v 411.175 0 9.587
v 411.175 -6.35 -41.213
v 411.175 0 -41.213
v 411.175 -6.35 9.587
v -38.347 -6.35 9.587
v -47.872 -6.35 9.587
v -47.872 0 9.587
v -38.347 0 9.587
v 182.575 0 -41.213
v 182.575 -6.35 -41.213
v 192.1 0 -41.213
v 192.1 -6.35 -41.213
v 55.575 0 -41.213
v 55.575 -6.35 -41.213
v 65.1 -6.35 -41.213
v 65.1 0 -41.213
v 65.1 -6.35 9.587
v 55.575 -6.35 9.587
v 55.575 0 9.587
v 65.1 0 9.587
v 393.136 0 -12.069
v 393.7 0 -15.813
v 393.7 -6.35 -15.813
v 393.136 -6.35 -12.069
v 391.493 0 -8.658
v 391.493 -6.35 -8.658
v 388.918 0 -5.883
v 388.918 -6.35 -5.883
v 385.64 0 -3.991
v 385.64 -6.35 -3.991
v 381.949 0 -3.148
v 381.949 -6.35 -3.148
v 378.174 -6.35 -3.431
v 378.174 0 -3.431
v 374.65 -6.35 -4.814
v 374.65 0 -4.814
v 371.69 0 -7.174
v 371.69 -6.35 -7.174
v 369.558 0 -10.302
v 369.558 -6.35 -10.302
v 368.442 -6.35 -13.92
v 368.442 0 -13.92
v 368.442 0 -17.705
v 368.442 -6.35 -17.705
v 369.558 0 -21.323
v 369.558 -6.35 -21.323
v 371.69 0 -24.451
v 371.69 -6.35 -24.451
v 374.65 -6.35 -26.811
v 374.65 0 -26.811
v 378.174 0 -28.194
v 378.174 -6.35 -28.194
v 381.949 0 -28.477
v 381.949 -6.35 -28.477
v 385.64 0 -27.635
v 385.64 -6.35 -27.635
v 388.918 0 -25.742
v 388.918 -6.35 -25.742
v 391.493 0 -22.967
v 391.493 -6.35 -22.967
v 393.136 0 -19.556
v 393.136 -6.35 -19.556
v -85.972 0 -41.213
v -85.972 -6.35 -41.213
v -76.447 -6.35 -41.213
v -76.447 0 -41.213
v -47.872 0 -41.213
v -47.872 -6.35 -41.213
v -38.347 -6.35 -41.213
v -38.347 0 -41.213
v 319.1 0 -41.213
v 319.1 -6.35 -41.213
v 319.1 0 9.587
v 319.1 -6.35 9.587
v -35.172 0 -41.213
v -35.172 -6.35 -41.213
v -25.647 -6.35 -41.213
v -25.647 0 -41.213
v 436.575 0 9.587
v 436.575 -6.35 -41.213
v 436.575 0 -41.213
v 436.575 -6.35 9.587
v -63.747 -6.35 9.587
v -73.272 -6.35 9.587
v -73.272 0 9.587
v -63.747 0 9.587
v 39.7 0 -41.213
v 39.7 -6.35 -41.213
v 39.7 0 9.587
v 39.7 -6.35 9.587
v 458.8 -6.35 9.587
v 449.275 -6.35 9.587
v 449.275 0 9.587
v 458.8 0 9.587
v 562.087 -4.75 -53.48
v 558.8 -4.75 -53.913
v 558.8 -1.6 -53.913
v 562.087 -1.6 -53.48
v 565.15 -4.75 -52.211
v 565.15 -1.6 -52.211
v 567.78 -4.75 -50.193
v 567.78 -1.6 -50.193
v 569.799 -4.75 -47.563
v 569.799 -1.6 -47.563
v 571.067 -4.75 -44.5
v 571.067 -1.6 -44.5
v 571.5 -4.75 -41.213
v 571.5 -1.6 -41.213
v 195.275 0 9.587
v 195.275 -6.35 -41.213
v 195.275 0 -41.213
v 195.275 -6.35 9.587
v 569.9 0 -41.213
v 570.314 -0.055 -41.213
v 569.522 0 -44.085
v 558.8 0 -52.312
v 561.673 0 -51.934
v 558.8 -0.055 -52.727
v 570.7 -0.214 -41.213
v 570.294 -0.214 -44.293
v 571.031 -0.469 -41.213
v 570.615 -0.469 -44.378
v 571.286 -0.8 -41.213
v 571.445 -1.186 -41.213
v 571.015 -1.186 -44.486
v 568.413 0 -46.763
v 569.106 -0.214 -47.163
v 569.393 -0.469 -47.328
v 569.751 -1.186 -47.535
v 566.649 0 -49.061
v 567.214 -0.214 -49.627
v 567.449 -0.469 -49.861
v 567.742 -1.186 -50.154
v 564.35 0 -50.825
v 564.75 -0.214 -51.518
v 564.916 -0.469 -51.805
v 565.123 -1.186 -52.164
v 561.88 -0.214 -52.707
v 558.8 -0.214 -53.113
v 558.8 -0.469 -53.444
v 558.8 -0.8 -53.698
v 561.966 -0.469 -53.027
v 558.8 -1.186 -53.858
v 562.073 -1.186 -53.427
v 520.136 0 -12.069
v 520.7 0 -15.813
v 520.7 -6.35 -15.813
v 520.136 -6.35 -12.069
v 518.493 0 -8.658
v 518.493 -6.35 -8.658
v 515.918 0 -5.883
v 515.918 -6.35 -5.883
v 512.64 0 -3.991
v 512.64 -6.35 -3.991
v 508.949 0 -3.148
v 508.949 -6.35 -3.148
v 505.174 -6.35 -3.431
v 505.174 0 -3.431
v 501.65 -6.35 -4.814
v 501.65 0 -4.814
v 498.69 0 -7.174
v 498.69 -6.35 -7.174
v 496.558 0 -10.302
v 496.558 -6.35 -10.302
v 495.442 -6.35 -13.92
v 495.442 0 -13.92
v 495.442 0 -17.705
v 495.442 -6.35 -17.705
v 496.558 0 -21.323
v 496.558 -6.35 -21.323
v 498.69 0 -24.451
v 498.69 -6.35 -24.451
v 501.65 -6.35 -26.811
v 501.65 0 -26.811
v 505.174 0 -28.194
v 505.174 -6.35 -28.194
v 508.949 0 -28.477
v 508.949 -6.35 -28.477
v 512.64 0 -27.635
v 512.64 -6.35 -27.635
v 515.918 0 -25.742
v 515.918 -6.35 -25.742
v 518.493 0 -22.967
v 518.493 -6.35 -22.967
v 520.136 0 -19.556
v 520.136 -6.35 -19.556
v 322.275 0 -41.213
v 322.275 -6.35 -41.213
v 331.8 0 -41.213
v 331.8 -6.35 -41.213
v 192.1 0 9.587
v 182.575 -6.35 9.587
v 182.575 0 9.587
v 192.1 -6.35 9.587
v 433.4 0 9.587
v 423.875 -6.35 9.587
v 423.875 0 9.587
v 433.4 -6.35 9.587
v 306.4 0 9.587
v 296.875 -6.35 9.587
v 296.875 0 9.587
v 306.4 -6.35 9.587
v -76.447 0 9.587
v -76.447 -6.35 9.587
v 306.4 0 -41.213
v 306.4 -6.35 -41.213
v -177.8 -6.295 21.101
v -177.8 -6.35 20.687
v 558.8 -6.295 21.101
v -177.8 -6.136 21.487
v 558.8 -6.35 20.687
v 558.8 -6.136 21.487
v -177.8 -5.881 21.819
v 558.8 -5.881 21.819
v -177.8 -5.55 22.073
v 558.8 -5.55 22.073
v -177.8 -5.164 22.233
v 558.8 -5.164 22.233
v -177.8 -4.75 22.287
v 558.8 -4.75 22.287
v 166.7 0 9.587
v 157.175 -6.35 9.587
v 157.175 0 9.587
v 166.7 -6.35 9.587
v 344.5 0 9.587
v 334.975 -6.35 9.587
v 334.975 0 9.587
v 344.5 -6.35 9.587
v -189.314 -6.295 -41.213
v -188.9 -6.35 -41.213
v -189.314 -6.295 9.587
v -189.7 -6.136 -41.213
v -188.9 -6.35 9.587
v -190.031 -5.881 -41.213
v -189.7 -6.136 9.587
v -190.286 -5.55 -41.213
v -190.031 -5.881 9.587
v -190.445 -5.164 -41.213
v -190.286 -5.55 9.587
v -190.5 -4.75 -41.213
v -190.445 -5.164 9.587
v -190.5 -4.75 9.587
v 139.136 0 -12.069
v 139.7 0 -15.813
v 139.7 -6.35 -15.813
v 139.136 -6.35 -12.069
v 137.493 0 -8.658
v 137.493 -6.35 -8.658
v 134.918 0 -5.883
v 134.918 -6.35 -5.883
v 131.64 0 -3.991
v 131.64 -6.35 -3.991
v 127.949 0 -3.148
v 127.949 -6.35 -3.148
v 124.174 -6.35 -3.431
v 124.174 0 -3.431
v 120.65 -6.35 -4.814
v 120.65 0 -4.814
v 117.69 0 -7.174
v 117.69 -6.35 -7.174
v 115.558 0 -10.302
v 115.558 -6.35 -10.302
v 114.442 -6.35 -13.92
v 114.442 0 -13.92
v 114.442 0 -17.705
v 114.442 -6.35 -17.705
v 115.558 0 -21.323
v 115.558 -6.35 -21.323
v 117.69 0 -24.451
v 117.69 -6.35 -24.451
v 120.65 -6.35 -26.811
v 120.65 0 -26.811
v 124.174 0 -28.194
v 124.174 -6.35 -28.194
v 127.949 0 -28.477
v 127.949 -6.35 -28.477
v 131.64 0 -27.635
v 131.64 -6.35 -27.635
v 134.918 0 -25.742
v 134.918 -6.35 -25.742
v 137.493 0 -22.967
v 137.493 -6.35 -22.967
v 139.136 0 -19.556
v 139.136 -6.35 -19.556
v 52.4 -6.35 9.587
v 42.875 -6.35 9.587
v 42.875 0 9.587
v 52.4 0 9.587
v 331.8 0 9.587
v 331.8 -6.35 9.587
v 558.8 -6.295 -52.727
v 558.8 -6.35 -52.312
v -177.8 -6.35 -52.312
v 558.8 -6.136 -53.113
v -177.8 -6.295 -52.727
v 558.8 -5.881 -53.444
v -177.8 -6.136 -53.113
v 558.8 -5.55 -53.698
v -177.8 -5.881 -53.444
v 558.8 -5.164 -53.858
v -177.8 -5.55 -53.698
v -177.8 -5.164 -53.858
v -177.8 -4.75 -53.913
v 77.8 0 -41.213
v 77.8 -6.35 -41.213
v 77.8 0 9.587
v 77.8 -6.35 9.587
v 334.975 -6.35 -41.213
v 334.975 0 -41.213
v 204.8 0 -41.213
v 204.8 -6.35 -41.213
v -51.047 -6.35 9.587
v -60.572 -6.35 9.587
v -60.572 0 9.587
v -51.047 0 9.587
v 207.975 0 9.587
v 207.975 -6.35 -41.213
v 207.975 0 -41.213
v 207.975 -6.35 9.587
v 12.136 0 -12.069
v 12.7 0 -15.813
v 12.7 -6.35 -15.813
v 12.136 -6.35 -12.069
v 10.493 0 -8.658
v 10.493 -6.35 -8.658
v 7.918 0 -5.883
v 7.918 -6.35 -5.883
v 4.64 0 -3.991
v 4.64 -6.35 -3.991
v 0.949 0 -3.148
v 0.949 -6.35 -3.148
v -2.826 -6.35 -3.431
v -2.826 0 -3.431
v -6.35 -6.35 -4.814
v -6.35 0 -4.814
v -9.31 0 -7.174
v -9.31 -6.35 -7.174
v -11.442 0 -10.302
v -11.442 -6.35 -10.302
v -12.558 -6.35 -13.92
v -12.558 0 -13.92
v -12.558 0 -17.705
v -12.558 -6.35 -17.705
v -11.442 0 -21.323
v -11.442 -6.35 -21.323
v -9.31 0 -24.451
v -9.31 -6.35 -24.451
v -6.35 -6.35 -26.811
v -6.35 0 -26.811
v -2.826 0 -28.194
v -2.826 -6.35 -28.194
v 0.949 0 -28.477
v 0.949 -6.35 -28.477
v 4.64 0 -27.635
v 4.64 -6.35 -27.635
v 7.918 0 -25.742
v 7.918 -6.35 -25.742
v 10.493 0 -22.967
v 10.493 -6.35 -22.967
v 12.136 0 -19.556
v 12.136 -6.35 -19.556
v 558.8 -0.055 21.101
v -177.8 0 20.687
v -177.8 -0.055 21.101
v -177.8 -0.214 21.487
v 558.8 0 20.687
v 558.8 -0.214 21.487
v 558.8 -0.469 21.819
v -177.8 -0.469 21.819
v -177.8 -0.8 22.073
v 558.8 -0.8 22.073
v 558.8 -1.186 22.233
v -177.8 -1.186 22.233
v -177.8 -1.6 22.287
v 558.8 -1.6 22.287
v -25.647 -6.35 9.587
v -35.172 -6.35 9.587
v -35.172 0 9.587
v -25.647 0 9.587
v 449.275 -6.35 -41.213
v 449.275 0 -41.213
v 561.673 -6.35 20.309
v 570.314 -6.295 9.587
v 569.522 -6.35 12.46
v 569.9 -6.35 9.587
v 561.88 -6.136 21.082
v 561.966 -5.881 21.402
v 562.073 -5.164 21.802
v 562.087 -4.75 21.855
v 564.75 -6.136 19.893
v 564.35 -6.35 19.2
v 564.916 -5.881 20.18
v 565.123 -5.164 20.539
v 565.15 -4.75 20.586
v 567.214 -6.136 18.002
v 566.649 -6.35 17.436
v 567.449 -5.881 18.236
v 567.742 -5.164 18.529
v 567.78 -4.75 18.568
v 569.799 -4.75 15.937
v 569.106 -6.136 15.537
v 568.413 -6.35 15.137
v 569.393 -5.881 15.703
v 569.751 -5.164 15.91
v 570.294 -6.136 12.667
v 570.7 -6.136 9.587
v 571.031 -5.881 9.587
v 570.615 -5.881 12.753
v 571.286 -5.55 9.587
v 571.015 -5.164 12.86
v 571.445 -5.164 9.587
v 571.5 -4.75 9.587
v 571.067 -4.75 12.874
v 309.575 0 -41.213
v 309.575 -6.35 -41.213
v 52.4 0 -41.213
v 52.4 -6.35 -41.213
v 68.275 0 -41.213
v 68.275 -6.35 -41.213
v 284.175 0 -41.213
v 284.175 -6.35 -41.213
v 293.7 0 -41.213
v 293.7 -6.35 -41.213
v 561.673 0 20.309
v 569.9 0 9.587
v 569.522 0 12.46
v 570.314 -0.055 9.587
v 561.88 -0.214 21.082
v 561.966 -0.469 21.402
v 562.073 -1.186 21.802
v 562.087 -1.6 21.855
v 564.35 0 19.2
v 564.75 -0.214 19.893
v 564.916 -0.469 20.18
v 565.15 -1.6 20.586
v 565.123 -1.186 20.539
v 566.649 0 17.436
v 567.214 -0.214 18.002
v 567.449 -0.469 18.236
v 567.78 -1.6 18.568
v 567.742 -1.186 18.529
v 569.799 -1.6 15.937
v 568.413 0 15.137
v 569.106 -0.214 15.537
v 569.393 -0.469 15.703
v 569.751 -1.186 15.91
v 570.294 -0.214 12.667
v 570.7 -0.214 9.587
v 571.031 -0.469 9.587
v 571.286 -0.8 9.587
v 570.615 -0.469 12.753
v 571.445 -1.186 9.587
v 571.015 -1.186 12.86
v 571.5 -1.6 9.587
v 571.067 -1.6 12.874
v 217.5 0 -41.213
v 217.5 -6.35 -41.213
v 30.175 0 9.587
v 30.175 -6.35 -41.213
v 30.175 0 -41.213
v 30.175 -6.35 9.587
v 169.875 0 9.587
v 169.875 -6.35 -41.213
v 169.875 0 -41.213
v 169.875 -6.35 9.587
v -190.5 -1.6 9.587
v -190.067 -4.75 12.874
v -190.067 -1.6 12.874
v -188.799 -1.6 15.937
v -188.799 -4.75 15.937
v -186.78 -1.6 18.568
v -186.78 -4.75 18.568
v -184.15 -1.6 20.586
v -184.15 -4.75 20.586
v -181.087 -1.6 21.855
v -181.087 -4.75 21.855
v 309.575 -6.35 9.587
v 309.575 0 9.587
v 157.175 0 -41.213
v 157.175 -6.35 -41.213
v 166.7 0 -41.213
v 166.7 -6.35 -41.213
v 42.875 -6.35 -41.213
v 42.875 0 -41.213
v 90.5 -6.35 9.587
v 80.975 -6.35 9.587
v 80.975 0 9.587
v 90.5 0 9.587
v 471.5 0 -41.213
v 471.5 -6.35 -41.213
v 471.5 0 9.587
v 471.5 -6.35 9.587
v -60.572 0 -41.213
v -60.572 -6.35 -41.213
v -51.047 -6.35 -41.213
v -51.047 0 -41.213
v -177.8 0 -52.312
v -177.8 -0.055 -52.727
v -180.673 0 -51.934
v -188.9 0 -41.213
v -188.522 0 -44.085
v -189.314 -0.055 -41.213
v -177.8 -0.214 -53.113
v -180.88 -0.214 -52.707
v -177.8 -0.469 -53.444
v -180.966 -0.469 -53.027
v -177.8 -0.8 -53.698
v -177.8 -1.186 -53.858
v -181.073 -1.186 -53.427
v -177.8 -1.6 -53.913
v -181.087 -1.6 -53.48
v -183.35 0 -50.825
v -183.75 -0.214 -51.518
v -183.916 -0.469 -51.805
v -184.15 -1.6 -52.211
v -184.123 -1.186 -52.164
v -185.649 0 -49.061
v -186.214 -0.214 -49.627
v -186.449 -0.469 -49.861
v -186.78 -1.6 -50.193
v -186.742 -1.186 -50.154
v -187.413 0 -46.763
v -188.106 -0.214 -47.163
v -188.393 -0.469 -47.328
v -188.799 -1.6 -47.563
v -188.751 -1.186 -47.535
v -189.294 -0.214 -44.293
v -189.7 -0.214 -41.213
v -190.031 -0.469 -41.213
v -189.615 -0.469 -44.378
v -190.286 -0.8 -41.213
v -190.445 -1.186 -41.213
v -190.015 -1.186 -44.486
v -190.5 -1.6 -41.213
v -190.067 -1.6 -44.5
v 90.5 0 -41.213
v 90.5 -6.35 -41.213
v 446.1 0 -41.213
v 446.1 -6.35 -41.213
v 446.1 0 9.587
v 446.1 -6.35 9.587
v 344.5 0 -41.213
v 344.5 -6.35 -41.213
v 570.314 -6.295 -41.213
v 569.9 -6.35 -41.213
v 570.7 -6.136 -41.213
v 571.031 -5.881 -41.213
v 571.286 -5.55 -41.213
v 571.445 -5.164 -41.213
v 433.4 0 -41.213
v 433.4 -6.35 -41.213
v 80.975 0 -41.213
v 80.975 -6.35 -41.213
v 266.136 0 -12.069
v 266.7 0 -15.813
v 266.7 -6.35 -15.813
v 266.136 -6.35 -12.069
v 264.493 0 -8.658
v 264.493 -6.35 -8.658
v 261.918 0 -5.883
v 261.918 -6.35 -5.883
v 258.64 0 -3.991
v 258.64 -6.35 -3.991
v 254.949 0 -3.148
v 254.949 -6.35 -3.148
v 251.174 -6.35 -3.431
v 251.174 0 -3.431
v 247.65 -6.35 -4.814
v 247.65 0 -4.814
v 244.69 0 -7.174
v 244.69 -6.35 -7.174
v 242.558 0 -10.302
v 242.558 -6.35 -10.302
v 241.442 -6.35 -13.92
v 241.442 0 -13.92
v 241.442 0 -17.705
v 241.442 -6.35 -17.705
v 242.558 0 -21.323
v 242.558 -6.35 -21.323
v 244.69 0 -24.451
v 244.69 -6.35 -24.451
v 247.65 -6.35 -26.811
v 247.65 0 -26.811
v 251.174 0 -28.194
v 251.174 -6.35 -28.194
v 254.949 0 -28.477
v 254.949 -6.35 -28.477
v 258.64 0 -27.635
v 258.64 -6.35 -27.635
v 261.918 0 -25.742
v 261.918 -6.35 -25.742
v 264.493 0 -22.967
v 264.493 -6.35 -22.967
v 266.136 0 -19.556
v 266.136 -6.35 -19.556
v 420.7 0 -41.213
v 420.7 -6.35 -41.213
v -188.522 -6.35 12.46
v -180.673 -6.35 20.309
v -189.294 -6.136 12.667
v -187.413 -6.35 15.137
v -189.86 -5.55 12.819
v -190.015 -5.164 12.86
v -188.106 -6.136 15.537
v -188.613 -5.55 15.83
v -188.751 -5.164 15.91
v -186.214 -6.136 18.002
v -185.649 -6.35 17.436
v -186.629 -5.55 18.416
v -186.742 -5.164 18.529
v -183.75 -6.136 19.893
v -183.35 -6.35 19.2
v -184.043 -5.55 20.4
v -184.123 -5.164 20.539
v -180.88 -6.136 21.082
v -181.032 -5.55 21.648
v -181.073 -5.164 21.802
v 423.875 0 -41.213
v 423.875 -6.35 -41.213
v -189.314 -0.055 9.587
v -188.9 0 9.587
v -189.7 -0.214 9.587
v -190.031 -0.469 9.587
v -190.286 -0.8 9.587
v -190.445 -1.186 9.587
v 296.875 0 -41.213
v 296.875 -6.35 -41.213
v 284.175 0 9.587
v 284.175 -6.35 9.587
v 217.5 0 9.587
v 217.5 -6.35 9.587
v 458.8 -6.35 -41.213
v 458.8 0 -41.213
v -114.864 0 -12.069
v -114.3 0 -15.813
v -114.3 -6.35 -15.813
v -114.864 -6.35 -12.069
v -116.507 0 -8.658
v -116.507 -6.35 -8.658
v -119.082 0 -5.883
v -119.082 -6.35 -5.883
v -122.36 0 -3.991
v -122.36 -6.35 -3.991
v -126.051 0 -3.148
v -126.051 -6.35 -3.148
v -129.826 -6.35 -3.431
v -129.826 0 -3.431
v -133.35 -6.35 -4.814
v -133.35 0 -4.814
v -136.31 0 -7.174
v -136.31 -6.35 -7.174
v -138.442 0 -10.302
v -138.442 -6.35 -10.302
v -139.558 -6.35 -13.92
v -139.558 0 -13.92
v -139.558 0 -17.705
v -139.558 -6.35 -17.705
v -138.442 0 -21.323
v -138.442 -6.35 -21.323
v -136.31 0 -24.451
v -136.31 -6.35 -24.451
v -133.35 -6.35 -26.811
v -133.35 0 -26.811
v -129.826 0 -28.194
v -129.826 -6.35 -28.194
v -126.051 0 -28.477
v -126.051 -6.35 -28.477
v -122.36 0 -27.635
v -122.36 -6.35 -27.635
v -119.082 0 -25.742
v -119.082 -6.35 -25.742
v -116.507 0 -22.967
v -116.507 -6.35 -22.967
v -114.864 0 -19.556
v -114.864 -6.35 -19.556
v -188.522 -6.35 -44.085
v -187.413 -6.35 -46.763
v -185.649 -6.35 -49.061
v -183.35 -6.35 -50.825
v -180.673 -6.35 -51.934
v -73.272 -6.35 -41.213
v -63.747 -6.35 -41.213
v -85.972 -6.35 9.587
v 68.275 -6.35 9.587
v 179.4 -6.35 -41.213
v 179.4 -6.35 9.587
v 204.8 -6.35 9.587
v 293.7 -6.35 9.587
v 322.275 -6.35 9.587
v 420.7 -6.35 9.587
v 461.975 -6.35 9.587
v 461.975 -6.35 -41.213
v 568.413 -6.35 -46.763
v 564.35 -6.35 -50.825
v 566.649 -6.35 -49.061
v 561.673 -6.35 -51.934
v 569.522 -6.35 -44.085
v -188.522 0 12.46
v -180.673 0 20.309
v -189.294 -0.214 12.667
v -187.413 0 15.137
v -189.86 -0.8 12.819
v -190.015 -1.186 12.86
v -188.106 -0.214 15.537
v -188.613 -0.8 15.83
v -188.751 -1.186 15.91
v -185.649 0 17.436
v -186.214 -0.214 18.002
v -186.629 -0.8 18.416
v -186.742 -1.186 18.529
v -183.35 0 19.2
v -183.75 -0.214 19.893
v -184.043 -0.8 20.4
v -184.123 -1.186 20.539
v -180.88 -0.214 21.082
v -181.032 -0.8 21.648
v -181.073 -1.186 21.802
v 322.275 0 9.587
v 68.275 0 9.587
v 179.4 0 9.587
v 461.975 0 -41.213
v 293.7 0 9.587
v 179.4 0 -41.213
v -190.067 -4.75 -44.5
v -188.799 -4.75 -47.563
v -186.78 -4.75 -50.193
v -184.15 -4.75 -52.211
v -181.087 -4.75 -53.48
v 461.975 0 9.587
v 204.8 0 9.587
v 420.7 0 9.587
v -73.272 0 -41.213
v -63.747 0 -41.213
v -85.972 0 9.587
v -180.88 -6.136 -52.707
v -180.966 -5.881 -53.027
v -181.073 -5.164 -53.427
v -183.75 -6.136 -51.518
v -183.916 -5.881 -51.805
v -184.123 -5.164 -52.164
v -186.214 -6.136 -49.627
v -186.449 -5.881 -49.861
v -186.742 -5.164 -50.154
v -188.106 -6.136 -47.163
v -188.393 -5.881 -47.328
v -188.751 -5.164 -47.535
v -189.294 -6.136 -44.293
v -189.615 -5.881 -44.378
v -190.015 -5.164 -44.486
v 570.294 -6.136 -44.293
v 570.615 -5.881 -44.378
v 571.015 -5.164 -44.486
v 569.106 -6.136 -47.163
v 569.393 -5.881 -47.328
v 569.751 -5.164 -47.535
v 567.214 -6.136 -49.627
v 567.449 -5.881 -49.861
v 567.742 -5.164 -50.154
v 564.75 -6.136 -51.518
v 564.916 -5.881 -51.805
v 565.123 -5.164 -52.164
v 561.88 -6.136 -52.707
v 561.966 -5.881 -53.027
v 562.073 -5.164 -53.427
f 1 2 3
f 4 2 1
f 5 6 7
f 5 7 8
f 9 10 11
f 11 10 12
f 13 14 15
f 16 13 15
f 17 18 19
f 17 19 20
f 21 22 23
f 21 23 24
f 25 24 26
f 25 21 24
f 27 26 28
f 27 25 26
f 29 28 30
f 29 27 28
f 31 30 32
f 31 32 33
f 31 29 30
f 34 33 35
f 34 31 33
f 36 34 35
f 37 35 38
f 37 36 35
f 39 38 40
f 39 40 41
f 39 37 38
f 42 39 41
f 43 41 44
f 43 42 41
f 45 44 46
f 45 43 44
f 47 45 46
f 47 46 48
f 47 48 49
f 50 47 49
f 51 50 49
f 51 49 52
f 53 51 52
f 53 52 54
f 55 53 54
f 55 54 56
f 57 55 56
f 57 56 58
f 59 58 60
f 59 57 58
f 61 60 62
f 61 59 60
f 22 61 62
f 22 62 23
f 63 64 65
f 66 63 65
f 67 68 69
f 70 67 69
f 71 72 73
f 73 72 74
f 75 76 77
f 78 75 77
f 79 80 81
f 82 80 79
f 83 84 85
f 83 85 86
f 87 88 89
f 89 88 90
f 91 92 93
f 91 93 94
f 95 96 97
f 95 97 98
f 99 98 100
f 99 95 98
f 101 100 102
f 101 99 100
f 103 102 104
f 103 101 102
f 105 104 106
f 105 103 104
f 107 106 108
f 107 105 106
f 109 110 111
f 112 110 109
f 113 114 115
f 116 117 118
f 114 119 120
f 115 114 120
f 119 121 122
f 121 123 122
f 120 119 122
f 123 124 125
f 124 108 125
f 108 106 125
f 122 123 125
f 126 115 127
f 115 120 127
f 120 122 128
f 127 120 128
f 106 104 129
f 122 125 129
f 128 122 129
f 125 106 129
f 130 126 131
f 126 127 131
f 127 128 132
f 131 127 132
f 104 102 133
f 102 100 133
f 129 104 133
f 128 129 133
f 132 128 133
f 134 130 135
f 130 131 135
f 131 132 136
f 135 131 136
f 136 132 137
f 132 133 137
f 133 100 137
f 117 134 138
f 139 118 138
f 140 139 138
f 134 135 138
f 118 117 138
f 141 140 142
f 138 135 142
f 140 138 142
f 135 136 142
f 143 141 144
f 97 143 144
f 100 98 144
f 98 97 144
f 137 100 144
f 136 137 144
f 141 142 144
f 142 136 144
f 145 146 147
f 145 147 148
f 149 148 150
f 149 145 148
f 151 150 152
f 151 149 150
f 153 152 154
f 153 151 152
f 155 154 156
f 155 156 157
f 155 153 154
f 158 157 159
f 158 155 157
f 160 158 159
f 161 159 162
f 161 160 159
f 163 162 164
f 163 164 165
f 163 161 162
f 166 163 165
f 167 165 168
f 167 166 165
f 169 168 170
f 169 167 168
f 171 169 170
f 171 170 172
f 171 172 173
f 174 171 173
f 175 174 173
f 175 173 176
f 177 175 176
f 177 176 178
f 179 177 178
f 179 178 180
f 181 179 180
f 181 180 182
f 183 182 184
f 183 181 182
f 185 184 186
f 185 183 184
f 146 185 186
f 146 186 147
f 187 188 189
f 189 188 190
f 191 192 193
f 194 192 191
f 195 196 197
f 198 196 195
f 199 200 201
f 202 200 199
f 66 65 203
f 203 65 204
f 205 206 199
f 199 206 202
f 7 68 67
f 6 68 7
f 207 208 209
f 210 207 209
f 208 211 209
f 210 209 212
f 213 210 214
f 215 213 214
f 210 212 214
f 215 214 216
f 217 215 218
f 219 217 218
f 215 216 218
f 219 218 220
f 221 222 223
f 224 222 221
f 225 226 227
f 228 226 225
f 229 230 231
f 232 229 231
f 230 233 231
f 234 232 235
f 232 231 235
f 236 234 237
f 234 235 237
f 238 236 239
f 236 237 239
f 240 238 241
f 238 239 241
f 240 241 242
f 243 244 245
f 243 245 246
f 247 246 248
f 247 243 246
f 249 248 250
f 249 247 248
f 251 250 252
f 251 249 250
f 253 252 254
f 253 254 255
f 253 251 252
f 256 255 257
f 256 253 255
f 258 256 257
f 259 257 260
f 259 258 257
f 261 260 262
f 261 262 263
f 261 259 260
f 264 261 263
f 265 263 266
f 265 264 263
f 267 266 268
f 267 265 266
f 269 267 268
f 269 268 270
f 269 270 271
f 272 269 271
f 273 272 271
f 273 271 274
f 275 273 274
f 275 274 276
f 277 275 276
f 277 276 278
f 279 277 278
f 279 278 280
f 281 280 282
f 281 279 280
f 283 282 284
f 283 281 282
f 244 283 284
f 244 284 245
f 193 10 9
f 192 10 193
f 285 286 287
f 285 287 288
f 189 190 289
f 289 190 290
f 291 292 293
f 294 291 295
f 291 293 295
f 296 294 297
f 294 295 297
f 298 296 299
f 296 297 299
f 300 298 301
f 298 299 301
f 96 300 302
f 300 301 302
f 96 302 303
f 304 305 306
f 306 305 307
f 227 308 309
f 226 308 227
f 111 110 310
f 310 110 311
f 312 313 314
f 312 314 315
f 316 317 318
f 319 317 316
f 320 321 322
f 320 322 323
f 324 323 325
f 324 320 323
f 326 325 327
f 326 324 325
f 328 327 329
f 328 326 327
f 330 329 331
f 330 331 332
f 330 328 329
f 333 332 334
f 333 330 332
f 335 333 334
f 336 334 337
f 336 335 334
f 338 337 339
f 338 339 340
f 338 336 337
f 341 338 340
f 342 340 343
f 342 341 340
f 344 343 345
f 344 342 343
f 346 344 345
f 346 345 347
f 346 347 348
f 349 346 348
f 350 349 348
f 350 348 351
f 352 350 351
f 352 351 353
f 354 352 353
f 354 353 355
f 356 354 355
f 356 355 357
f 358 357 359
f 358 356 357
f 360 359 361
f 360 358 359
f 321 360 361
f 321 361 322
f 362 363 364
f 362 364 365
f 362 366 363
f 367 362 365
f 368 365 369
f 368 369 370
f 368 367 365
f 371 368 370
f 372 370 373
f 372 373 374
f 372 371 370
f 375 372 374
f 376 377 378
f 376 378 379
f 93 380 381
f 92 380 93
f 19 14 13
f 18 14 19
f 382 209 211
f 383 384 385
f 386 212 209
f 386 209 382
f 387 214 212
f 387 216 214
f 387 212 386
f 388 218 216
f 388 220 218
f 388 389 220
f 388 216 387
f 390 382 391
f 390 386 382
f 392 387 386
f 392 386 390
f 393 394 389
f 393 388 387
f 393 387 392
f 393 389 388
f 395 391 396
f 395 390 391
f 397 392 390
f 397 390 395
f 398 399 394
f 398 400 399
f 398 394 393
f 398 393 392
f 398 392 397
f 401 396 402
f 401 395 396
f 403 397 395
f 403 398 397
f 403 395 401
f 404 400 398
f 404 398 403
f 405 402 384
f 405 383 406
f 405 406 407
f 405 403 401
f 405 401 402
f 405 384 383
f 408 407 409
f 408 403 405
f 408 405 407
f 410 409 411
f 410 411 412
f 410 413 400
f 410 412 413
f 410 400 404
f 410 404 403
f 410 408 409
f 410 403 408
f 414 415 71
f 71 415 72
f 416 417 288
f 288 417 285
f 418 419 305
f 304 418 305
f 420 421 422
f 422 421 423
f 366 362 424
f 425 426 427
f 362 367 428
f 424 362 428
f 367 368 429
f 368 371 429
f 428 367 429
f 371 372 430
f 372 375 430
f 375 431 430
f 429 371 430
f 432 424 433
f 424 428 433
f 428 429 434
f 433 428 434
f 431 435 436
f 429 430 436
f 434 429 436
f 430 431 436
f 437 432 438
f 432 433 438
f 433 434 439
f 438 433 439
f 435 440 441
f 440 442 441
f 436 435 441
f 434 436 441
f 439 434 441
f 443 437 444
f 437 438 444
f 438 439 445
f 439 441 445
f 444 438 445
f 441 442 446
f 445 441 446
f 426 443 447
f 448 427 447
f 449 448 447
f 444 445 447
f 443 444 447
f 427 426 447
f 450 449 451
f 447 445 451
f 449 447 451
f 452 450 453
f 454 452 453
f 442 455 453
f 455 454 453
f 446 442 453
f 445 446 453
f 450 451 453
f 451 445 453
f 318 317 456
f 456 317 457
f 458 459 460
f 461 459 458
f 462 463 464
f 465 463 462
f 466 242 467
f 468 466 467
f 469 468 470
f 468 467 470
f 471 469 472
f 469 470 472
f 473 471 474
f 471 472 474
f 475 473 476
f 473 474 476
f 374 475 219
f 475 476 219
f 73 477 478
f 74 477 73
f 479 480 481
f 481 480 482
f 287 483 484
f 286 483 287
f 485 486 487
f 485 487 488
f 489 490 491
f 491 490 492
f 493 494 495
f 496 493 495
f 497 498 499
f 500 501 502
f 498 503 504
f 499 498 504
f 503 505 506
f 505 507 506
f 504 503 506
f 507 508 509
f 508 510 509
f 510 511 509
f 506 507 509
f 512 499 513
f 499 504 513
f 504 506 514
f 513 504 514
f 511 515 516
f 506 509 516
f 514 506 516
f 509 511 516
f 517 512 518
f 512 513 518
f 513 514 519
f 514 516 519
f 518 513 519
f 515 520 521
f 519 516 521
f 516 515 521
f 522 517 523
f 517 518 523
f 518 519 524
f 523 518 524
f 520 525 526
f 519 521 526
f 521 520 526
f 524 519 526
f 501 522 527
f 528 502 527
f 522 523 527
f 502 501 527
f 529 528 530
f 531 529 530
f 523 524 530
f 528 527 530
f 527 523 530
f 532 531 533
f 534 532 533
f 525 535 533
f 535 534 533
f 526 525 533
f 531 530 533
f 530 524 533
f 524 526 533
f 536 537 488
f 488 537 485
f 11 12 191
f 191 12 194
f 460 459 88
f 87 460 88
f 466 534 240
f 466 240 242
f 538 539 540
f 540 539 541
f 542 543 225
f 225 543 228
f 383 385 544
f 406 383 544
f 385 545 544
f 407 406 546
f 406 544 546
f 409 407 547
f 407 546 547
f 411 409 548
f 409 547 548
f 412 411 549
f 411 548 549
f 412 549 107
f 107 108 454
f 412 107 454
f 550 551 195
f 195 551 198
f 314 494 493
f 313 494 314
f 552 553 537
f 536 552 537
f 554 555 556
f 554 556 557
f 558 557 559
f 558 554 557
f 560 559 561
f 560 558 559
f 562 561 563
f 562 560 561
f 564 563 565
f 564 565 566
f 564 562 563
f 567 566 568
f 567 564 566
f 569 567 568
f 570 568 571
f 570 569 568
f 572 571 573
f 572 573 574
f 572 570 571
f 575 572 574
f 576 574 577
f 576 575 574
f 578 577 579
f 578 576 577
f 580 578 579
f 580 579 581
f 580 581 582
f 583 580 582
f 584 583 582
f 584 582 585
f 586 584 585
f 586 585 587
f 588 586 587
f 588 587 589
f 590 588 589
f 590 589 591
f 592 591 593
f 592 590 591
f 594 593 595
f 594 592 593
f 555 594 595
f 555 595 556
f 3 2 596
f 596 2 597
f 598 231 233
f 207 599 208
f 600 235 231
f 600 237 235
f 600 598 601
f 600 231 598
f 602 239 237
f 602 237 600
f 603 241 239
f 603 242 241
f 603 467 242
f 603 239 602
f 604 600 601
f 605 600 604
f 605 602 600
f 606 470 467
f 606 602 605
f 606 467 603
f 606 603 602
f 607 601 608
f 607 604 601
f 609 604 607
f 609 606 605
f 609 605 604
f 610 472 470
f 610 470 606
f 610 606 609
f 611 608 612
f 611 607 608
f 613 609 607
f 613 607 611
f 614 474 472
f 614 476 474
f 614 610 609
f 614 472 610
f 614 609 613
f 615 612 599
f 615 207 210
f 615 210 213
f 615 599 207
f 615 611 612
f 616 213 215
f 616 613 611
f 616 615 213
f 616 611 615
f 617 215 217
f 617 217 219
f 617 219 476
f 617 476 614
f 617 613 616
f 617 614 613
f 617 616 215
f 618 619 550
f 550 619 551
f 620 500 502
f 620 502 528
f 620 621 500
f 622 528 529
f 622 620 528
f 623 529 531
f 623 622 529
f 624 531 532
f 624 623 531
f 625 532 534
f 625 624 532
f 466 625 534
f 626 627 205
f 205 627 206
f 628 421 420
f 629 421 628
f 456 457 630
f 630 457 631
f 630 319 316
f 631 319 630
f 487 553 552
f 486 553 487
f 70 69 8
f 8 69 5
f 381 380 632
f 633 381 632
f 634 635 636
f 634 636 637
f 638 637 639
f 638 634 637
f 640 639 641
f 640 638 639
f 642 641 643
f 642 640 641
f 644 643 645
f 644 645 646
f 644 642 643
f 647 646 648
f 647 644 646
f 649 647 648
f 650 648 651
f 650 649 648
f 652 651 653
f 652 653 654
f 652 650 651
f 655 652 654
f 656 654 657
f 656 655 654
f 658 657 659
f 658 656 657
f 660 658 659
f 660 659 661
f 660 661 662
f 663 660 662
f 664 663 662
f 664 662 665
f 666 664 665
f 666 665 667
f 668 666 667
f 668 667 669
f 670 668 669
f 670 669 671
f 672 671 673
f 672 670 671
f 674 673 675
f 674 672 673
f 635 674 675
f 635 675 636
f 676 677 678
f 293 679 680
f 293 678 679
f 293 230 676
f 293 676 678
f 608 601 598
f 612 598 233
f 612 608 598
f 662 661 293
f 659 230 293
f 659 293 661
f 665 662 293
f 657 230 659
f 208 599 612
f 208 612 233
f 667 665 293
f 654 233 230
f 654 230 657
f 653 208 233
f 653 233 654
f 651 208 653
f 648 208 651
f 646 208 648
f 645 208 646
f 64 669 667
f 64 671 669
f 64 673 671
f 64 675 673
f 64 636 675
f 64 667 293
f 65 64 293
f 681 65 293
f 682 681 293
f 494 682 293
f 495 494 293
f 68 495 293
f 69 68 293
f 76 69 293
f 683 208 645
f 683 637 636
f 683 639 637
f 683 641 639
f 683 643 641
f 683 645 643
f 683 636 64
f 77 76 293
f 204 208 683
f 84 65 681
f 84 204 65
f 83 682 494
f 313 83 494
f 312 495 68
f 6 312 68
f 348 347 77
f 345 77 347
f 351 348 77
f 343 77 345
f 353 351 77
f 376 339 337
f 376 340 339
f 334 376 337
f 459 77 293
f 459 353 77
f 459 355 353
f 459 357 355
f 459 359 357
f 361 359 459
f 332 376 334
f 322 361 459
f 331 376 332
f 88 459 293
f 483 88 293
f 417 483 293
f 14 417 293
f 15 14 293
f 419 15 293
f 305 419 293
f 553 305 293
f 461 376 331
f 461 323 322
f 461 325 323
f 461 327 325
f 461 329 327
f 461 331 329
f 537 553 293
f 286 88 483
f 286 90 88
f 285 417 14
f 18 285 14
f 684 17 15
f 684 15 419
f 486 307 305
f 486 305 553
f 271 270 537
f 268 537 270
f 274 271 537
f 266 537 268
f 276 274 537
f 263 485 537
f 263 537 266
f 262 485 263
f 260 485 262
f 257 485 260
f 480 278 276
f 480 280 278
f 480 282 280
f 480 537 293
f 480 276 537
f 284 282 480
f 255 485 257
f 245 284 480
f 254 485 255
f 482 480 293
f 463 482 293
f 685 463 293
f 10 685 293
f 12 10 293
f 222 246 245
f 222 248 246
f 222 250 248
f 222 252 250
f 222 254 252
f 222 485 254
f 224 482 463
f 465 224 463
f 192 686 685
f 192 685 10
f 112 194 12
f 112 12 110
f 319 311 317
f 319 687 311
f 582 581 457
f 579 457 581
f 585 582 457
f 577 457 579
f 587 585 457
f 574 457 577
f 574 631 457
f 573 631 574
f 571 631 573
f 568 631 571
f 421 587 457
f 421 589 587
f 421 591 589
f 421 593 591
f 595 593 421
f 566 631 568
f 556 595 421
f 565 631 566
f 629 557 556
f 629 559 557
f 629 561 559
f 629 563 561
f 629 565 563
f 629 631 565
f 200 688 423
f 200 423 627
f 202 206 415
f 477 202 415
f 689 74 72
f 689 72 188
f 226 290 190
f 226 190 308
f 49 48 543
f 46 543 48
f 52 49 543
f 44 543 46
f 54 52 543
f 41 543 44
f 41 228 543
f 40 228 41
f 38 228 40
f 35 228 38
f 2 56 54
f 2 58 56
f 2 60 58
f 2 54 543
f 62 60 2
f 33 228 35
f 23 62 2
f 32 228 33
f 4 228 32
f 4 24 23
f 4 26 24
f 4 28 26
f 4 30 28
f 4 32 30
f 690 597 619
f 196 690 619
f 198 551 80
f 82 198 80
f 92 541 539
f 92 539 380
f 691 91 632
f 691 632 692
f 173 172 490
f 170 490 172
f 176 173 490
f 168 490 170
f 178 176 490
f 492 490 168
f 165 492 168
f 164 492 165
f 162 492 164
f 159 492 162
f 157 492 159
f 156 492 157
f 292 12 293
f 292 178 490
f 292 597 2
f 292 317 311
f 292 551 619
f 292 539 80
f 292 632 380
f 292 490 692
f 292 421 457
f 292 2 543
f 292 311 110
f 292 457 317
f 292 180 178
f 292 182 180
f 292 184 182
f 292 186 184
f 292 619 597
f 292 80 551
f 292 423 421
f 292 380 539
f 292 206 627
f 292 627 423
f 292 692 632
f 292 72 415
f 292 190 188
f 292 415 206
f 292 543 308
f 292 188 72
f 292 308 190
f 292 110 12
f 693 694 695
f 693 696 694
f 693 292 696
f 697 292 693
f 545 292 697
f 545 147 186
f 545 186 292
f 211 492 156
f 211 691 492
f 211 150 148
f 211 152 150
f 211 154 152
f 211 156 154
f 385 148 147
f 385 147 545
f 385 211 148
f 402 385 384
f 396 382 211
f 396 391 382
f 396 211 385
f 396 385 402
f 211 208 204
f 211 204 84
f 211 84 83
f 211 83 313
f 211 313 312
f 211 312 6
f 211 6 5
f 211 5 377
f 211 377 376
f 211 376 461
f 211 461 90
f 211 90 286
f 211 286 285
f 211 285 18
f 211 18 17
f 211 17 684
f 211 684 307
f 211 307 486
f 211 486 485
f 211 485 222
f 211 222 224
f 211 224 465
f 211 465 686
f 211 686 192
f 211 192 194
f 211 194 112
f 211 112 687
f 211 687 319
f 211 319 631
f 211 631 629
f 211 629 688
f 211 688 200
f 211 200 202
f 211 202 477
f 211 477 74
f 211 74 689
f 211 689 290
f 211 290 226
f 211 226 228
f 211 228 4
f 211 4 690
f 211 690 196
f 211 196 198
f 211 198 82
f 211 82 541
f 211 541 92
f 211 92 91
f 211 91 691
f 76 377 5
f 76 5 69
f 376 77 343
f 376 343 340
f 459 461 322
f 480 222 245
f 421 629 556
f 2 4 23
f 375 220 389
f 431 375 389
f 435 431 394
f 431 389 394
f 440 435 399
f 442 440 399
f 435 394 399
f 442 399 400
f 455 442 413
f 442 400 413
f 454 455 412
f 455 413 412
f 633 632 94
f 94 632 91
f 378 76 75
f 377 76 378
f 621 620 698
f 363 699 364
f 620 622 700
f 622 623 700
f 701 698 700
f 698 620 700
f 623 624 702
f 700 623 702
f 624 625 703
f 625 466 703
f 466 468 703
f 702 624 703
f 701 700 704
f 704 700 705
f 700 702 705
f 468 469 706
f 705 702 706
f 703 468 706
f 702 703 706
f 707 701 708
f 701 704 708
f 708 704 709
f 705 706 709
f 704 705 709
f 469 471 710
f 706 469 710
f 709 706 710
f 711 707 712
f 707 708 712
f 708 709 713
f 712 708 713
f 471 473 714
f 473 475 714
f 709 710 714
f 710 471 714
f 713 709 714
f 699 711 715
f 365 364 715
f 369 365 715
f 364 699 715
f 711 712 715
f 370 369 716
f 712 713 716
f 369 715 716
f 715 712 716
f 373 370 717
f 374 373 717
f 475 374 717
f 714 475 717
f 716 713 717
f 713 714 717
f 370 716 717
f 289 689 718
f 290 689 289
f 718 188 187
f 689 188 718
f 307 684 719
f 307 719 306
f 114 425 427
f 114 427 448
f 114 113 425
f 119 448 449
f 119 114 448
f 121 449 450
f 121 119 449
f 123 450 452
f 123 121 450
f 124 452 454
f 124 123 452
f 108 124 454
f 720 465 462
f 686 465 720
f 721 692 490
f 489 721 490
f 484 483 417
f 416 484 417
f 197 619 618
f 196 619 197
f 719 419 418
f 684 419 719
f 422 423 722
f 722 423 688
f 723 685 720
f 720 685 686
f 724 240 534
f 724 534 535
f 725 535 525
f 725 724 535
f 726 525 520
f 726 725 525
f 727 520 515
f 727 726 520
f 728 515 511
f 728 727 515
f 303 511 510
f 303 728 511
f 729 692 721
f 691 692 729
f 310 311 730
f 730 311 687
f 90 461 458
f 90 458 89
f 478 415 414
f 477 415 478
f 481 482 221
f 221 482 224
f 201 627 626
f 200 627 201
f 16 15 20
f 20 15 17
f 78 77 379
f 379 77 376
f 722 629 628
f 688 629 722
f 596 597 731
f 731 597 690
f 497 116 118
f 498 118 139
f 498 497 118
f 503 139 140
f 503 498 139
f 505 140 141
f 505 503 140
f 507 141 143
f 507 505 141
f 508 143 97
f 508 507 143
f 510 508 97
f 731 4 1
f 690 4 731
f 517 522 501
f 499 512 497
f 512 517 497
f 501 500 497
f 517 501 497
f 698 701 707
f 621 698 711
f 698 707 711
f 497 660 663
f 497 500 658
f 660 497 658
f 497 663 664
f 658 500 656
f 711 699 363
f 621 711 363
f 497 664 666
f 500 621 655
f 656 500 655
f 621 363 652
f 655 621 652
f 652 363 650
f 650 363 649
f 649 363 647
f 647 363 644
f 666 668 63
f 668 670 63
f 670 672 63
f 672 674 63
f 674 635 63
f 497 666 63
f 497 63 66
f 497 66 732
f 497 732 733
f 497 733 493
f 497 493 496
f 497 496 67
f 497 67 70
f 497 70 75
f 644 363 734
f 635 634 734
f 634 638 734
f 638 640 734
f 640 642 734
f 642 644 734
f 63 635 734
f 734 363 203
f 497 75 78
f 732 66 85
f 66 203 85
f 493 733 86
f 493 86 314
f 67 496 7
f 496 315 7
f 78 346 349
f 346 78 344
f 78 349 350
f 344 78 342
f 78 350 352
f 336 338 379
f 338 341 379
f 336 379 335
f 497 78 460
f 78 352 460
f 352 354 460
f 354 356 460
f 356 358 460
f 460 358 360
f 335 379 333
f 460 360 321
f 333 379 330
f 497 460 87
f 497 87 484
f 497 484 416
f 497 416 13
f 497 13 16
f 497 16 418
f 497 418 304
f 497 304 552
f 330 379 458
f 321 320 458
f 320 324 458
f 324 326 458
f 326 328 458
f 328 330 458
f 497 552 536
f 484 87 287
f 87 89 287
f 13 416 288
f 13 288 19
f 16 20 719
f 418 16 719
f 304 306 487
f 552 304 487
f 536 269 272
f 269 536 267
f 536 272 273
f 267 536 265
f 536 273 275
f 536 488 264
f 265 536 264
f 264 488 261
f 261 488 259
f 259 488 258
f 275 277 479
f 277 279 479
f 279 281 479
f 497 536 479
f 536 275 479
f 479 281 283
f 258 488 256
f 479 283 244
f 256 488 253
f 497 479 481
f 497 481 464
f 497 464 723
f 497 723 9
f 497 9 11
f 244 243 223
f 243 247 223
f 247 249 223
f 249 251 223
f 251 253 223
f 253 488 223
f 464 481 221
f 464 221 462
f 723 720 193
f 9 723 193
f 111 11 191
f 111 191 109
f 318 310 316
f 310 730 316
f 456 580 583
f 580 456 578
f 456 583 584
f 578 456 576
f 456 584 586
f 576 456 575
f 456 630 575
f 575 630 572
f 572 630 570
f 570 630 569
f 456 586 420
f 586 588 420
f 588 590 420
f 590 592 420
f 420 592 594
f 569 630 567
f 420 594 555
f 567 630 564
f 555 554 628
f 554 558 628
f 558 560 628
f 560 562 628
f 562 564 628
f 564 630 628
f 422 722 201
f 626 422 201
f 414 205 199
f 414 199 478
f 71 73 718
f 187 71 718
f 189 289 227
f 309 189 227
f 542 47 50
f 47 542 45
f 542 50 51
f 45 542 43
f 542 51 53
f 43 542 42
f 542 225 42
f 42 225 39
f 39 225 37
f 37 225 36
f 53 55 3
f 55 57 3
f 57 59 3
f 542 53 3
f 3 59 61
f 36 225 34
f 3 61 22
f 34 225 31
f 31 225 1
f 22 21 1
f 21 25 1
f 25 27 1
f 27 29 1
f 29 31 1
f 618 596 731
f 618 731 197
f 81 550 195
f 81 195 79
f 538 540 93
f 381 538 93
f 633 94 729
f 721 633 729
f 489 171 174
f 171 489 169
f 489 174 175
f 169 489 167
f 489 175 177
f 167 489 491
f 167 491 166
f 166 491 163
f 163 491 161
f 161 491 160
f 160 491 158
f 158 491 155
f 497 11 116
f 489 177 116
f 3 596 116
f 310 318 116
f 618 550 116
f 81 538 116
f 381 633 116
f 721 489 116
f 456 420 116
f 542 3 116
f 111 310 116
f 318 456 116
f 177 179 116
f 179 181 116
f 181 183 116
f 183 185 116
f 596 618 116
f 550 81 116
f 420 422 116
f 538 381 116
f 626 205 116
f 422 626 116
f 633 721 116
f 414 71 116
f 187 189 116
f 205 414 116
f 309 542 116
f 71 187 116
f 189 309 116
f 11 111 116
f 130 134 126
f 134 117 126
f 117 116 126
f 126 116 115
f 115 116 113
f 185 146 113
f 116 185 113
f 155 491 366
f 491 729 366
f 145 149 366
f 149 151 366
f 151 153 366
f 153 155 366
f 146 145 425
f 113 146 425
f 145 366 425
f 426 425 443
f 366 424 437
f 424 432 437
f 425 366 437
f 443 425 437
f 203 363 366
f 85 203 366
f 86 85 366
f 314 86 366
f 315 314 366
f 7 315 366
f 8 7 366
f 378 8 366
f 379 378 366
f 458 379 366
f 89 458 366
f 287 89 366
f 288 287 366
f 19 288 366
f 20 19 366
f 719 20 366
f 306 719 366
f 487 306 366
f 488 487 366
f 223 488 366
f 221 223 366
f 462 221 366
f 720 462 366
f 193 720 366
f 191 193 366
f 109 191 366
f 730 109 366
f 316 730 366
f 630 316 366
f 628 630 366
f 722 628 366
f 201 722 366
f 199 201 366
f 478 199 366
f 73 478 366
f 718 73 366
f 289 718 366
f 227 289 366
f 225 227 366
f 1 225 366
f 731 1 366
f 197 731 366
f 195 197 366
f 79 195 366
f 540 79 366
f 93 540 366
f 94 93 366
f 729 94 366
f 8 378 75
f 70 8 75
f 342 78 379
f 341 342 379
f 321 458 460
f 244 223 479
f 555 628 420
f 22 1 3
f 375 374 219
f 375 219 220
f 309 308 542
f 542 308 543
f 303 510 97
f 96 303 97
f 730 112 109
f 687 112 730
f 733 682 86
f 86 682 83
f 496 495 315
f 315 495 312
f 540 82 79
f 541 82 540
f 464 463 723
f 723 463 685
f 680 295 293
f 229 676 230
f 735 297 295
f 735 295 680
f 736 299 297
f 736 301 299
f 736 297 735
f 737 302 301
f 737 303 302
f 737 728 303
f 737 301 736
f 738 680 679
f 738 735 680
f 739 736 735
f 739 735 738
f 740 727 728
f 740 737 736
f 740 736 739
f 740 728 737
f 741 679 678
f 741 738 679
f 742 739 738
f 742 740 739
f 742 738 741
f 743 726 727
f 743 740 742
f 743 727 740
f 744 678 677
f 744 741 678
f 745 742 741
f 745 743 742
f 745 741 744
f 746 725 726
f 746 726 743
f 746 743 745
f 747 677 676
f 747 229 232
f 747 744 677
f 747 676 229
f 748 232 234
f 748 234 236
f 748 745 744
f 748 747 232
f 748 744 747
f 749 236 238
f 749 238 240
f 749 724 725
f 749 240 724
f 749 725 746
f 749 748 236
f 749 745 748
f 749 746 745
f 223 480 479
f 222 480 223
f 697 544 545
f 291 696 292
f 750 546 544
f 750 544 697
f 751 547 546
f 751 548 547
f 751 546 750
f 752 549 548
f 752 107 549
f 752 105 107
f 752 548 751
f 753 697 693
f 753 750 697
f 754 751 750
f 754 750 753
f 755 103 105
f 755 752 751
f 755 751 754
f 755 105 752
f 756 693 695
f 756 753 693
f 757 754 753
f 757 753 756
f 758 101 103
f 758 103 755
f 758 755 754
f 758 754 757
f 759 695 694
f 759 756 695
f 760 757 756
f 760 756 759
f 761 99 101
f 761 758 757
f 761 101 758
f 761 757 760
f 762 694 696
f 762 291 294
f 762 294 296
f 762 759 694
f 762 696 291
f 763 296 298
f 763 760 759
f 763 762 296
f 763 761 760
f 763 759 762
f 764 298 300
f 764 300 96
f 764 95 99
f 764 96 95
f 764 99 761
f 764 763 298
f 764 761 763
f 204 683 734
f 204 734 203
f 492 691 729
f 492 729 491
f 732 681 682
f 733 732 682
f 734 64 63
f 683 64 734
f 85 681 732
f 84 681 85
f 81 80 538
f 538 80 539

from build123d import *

# Parameters (mm, degrees)
F0_W     = 762
F0_H     = 76.2
F0_R     = 12.7
F1_DEPTH = 6.35
F2_W     = 9.525
F2_H     = 50.8
F3_DEPTH = 25.4
F4_R     = 12.7
F5_R     = 1.6002


with BuildPart() as f1:
    # F0 (on Front) → F1 (new body)
    with BuildSketch(Plane.XZ):
        with Locations((190.5, -15.812627)):
            Rectangle(F0_W, F0_H)
        with Locations((-127, -15.812627)):
            Circle(F0_R, mode=Mode.SUBTRACT)
        with Locations((0, -15.812627)):
            Circle(F0_R, mode=Mode.SUBTRACT)
        with Locations((127, -15.812627)):
            Circle(F0_R, mode=Mode.SUBTRACT)
        with Locations((254, -15.812627)):
            Circle(F0_R, mode=Mode.SUBTRACT)
        with Locations((381, -15.812627)):
            Circle(F0_R, mode=Mode.SUBTRACT)
        with Locations((508, -15.812627)):
            Circle(F0_R, mode=Mode.SUBTRACT)
    extrude(amount=F1_DEPTH)

    # F2 (on face) → F3 (cut)
    with BuildSketch(Plane.XZ.offset(6.35)):
        with Locations((34.9377, -15.812627)):
            Rectangle(F2_W, F2_H)
        with Locations((47.6377, -15.812627)):
            Rectangle(F2_W, F2_H)
        with Locations((60.3377, -15.812627)):
            Rectangle(F2_W, F2_H)
        with Locations((73.0377, -15.812627)):
            Rectangle(F2_W, F2_H)
        with Locations((85.7377, -15.812627)):
            Rectangle(F2_W, F2_H)
        with Locations((161.9377, -15.812627)):
            Rectangle(F2_W, F2_H)
        with Locations((174.6377, -15.812627)):
            Rectangle(F2_W, F2_H)
        with Locations((187.3377, -15.812627)):
            Rectangle(F2_W, F2_H)
        with Locations((200.0377, -15.812627)):
            Rectangle(F2_W, F2_H)
        with Locations((212.7377, -15.812627)):
            Rectangle(F2_W, F2_H)
        with Locations((288.9377, -15.812627)):
            Rectangle(F2_W, F2_H)
        with Locations((301.6377, -15.812627)):
            Rectangle(F2_W, F2_H)
        with Locations((314.3377, -15.812627)):
            Rectangle(F2_W, F2_H)
        with Locations((327.0377, -15.812627)):
            Rectangle(F2_W, F2_H)
        with Locations((339.7377, -15.812627)):
            Rectangle(F2_W, F2_H)
        with Locations((415.9377, -15.812627)):
            Rectangle(F2_W, F2_H)
        with Locations((428.6377, -15.812627)):
            Rectangle(F2_W, F2_H)
        with Locations((441.3377, -15.812627)):
            Rectangle(F2_W, F2_H)
        with Locations((454.0377, -15.812627)):
            Rectangle(F2_W, F2_H)
        with Locations((466.7377, -15.812627)):
            Rectangle(F2_W, F2_H)
        with Locations((-81.209007, -15.812627)):
            Rectangle(F2_W, F2_H)
        with Locations((-68.509007, -15.812627)):
            Rectangle(F2_W, F2_H)
        with Locations((-55.809007, -15.812627)):
            Rectangle(F2_W, F2_H)
        with Locations((-43.109007, -15.812627)):
            Rectangle(F2_W, F2_H)
        with Locations((-30.409007, -15.812627)):
            Rectangle(F2_W, F2_H)
    extrude(amount=-F3_DEPTH, mode=Mode.SUBTRACT)

    # F4
    f4_edges = [f1.edges().sort_by_distance(p)[0] for p in [
        (-190.5, -3.175, 22.287373),
        (-190.5, -3.175, -53.912627),
        (571.5, -3.175, 22.287373),
        (571.5, -3.175, -53.912627),
    ]]
    fillet(f4_edges, radius=F4_R)

    # F5
    f5_edges = [f1.edges().sort_by_distance(p)[0] for p in [
        (190.5, -6.35, 22.287373),
        (190.5, 0, 22.287373),
    ]]
    fillet(f5_edges, radius=F5_R)


solid = f1.part
